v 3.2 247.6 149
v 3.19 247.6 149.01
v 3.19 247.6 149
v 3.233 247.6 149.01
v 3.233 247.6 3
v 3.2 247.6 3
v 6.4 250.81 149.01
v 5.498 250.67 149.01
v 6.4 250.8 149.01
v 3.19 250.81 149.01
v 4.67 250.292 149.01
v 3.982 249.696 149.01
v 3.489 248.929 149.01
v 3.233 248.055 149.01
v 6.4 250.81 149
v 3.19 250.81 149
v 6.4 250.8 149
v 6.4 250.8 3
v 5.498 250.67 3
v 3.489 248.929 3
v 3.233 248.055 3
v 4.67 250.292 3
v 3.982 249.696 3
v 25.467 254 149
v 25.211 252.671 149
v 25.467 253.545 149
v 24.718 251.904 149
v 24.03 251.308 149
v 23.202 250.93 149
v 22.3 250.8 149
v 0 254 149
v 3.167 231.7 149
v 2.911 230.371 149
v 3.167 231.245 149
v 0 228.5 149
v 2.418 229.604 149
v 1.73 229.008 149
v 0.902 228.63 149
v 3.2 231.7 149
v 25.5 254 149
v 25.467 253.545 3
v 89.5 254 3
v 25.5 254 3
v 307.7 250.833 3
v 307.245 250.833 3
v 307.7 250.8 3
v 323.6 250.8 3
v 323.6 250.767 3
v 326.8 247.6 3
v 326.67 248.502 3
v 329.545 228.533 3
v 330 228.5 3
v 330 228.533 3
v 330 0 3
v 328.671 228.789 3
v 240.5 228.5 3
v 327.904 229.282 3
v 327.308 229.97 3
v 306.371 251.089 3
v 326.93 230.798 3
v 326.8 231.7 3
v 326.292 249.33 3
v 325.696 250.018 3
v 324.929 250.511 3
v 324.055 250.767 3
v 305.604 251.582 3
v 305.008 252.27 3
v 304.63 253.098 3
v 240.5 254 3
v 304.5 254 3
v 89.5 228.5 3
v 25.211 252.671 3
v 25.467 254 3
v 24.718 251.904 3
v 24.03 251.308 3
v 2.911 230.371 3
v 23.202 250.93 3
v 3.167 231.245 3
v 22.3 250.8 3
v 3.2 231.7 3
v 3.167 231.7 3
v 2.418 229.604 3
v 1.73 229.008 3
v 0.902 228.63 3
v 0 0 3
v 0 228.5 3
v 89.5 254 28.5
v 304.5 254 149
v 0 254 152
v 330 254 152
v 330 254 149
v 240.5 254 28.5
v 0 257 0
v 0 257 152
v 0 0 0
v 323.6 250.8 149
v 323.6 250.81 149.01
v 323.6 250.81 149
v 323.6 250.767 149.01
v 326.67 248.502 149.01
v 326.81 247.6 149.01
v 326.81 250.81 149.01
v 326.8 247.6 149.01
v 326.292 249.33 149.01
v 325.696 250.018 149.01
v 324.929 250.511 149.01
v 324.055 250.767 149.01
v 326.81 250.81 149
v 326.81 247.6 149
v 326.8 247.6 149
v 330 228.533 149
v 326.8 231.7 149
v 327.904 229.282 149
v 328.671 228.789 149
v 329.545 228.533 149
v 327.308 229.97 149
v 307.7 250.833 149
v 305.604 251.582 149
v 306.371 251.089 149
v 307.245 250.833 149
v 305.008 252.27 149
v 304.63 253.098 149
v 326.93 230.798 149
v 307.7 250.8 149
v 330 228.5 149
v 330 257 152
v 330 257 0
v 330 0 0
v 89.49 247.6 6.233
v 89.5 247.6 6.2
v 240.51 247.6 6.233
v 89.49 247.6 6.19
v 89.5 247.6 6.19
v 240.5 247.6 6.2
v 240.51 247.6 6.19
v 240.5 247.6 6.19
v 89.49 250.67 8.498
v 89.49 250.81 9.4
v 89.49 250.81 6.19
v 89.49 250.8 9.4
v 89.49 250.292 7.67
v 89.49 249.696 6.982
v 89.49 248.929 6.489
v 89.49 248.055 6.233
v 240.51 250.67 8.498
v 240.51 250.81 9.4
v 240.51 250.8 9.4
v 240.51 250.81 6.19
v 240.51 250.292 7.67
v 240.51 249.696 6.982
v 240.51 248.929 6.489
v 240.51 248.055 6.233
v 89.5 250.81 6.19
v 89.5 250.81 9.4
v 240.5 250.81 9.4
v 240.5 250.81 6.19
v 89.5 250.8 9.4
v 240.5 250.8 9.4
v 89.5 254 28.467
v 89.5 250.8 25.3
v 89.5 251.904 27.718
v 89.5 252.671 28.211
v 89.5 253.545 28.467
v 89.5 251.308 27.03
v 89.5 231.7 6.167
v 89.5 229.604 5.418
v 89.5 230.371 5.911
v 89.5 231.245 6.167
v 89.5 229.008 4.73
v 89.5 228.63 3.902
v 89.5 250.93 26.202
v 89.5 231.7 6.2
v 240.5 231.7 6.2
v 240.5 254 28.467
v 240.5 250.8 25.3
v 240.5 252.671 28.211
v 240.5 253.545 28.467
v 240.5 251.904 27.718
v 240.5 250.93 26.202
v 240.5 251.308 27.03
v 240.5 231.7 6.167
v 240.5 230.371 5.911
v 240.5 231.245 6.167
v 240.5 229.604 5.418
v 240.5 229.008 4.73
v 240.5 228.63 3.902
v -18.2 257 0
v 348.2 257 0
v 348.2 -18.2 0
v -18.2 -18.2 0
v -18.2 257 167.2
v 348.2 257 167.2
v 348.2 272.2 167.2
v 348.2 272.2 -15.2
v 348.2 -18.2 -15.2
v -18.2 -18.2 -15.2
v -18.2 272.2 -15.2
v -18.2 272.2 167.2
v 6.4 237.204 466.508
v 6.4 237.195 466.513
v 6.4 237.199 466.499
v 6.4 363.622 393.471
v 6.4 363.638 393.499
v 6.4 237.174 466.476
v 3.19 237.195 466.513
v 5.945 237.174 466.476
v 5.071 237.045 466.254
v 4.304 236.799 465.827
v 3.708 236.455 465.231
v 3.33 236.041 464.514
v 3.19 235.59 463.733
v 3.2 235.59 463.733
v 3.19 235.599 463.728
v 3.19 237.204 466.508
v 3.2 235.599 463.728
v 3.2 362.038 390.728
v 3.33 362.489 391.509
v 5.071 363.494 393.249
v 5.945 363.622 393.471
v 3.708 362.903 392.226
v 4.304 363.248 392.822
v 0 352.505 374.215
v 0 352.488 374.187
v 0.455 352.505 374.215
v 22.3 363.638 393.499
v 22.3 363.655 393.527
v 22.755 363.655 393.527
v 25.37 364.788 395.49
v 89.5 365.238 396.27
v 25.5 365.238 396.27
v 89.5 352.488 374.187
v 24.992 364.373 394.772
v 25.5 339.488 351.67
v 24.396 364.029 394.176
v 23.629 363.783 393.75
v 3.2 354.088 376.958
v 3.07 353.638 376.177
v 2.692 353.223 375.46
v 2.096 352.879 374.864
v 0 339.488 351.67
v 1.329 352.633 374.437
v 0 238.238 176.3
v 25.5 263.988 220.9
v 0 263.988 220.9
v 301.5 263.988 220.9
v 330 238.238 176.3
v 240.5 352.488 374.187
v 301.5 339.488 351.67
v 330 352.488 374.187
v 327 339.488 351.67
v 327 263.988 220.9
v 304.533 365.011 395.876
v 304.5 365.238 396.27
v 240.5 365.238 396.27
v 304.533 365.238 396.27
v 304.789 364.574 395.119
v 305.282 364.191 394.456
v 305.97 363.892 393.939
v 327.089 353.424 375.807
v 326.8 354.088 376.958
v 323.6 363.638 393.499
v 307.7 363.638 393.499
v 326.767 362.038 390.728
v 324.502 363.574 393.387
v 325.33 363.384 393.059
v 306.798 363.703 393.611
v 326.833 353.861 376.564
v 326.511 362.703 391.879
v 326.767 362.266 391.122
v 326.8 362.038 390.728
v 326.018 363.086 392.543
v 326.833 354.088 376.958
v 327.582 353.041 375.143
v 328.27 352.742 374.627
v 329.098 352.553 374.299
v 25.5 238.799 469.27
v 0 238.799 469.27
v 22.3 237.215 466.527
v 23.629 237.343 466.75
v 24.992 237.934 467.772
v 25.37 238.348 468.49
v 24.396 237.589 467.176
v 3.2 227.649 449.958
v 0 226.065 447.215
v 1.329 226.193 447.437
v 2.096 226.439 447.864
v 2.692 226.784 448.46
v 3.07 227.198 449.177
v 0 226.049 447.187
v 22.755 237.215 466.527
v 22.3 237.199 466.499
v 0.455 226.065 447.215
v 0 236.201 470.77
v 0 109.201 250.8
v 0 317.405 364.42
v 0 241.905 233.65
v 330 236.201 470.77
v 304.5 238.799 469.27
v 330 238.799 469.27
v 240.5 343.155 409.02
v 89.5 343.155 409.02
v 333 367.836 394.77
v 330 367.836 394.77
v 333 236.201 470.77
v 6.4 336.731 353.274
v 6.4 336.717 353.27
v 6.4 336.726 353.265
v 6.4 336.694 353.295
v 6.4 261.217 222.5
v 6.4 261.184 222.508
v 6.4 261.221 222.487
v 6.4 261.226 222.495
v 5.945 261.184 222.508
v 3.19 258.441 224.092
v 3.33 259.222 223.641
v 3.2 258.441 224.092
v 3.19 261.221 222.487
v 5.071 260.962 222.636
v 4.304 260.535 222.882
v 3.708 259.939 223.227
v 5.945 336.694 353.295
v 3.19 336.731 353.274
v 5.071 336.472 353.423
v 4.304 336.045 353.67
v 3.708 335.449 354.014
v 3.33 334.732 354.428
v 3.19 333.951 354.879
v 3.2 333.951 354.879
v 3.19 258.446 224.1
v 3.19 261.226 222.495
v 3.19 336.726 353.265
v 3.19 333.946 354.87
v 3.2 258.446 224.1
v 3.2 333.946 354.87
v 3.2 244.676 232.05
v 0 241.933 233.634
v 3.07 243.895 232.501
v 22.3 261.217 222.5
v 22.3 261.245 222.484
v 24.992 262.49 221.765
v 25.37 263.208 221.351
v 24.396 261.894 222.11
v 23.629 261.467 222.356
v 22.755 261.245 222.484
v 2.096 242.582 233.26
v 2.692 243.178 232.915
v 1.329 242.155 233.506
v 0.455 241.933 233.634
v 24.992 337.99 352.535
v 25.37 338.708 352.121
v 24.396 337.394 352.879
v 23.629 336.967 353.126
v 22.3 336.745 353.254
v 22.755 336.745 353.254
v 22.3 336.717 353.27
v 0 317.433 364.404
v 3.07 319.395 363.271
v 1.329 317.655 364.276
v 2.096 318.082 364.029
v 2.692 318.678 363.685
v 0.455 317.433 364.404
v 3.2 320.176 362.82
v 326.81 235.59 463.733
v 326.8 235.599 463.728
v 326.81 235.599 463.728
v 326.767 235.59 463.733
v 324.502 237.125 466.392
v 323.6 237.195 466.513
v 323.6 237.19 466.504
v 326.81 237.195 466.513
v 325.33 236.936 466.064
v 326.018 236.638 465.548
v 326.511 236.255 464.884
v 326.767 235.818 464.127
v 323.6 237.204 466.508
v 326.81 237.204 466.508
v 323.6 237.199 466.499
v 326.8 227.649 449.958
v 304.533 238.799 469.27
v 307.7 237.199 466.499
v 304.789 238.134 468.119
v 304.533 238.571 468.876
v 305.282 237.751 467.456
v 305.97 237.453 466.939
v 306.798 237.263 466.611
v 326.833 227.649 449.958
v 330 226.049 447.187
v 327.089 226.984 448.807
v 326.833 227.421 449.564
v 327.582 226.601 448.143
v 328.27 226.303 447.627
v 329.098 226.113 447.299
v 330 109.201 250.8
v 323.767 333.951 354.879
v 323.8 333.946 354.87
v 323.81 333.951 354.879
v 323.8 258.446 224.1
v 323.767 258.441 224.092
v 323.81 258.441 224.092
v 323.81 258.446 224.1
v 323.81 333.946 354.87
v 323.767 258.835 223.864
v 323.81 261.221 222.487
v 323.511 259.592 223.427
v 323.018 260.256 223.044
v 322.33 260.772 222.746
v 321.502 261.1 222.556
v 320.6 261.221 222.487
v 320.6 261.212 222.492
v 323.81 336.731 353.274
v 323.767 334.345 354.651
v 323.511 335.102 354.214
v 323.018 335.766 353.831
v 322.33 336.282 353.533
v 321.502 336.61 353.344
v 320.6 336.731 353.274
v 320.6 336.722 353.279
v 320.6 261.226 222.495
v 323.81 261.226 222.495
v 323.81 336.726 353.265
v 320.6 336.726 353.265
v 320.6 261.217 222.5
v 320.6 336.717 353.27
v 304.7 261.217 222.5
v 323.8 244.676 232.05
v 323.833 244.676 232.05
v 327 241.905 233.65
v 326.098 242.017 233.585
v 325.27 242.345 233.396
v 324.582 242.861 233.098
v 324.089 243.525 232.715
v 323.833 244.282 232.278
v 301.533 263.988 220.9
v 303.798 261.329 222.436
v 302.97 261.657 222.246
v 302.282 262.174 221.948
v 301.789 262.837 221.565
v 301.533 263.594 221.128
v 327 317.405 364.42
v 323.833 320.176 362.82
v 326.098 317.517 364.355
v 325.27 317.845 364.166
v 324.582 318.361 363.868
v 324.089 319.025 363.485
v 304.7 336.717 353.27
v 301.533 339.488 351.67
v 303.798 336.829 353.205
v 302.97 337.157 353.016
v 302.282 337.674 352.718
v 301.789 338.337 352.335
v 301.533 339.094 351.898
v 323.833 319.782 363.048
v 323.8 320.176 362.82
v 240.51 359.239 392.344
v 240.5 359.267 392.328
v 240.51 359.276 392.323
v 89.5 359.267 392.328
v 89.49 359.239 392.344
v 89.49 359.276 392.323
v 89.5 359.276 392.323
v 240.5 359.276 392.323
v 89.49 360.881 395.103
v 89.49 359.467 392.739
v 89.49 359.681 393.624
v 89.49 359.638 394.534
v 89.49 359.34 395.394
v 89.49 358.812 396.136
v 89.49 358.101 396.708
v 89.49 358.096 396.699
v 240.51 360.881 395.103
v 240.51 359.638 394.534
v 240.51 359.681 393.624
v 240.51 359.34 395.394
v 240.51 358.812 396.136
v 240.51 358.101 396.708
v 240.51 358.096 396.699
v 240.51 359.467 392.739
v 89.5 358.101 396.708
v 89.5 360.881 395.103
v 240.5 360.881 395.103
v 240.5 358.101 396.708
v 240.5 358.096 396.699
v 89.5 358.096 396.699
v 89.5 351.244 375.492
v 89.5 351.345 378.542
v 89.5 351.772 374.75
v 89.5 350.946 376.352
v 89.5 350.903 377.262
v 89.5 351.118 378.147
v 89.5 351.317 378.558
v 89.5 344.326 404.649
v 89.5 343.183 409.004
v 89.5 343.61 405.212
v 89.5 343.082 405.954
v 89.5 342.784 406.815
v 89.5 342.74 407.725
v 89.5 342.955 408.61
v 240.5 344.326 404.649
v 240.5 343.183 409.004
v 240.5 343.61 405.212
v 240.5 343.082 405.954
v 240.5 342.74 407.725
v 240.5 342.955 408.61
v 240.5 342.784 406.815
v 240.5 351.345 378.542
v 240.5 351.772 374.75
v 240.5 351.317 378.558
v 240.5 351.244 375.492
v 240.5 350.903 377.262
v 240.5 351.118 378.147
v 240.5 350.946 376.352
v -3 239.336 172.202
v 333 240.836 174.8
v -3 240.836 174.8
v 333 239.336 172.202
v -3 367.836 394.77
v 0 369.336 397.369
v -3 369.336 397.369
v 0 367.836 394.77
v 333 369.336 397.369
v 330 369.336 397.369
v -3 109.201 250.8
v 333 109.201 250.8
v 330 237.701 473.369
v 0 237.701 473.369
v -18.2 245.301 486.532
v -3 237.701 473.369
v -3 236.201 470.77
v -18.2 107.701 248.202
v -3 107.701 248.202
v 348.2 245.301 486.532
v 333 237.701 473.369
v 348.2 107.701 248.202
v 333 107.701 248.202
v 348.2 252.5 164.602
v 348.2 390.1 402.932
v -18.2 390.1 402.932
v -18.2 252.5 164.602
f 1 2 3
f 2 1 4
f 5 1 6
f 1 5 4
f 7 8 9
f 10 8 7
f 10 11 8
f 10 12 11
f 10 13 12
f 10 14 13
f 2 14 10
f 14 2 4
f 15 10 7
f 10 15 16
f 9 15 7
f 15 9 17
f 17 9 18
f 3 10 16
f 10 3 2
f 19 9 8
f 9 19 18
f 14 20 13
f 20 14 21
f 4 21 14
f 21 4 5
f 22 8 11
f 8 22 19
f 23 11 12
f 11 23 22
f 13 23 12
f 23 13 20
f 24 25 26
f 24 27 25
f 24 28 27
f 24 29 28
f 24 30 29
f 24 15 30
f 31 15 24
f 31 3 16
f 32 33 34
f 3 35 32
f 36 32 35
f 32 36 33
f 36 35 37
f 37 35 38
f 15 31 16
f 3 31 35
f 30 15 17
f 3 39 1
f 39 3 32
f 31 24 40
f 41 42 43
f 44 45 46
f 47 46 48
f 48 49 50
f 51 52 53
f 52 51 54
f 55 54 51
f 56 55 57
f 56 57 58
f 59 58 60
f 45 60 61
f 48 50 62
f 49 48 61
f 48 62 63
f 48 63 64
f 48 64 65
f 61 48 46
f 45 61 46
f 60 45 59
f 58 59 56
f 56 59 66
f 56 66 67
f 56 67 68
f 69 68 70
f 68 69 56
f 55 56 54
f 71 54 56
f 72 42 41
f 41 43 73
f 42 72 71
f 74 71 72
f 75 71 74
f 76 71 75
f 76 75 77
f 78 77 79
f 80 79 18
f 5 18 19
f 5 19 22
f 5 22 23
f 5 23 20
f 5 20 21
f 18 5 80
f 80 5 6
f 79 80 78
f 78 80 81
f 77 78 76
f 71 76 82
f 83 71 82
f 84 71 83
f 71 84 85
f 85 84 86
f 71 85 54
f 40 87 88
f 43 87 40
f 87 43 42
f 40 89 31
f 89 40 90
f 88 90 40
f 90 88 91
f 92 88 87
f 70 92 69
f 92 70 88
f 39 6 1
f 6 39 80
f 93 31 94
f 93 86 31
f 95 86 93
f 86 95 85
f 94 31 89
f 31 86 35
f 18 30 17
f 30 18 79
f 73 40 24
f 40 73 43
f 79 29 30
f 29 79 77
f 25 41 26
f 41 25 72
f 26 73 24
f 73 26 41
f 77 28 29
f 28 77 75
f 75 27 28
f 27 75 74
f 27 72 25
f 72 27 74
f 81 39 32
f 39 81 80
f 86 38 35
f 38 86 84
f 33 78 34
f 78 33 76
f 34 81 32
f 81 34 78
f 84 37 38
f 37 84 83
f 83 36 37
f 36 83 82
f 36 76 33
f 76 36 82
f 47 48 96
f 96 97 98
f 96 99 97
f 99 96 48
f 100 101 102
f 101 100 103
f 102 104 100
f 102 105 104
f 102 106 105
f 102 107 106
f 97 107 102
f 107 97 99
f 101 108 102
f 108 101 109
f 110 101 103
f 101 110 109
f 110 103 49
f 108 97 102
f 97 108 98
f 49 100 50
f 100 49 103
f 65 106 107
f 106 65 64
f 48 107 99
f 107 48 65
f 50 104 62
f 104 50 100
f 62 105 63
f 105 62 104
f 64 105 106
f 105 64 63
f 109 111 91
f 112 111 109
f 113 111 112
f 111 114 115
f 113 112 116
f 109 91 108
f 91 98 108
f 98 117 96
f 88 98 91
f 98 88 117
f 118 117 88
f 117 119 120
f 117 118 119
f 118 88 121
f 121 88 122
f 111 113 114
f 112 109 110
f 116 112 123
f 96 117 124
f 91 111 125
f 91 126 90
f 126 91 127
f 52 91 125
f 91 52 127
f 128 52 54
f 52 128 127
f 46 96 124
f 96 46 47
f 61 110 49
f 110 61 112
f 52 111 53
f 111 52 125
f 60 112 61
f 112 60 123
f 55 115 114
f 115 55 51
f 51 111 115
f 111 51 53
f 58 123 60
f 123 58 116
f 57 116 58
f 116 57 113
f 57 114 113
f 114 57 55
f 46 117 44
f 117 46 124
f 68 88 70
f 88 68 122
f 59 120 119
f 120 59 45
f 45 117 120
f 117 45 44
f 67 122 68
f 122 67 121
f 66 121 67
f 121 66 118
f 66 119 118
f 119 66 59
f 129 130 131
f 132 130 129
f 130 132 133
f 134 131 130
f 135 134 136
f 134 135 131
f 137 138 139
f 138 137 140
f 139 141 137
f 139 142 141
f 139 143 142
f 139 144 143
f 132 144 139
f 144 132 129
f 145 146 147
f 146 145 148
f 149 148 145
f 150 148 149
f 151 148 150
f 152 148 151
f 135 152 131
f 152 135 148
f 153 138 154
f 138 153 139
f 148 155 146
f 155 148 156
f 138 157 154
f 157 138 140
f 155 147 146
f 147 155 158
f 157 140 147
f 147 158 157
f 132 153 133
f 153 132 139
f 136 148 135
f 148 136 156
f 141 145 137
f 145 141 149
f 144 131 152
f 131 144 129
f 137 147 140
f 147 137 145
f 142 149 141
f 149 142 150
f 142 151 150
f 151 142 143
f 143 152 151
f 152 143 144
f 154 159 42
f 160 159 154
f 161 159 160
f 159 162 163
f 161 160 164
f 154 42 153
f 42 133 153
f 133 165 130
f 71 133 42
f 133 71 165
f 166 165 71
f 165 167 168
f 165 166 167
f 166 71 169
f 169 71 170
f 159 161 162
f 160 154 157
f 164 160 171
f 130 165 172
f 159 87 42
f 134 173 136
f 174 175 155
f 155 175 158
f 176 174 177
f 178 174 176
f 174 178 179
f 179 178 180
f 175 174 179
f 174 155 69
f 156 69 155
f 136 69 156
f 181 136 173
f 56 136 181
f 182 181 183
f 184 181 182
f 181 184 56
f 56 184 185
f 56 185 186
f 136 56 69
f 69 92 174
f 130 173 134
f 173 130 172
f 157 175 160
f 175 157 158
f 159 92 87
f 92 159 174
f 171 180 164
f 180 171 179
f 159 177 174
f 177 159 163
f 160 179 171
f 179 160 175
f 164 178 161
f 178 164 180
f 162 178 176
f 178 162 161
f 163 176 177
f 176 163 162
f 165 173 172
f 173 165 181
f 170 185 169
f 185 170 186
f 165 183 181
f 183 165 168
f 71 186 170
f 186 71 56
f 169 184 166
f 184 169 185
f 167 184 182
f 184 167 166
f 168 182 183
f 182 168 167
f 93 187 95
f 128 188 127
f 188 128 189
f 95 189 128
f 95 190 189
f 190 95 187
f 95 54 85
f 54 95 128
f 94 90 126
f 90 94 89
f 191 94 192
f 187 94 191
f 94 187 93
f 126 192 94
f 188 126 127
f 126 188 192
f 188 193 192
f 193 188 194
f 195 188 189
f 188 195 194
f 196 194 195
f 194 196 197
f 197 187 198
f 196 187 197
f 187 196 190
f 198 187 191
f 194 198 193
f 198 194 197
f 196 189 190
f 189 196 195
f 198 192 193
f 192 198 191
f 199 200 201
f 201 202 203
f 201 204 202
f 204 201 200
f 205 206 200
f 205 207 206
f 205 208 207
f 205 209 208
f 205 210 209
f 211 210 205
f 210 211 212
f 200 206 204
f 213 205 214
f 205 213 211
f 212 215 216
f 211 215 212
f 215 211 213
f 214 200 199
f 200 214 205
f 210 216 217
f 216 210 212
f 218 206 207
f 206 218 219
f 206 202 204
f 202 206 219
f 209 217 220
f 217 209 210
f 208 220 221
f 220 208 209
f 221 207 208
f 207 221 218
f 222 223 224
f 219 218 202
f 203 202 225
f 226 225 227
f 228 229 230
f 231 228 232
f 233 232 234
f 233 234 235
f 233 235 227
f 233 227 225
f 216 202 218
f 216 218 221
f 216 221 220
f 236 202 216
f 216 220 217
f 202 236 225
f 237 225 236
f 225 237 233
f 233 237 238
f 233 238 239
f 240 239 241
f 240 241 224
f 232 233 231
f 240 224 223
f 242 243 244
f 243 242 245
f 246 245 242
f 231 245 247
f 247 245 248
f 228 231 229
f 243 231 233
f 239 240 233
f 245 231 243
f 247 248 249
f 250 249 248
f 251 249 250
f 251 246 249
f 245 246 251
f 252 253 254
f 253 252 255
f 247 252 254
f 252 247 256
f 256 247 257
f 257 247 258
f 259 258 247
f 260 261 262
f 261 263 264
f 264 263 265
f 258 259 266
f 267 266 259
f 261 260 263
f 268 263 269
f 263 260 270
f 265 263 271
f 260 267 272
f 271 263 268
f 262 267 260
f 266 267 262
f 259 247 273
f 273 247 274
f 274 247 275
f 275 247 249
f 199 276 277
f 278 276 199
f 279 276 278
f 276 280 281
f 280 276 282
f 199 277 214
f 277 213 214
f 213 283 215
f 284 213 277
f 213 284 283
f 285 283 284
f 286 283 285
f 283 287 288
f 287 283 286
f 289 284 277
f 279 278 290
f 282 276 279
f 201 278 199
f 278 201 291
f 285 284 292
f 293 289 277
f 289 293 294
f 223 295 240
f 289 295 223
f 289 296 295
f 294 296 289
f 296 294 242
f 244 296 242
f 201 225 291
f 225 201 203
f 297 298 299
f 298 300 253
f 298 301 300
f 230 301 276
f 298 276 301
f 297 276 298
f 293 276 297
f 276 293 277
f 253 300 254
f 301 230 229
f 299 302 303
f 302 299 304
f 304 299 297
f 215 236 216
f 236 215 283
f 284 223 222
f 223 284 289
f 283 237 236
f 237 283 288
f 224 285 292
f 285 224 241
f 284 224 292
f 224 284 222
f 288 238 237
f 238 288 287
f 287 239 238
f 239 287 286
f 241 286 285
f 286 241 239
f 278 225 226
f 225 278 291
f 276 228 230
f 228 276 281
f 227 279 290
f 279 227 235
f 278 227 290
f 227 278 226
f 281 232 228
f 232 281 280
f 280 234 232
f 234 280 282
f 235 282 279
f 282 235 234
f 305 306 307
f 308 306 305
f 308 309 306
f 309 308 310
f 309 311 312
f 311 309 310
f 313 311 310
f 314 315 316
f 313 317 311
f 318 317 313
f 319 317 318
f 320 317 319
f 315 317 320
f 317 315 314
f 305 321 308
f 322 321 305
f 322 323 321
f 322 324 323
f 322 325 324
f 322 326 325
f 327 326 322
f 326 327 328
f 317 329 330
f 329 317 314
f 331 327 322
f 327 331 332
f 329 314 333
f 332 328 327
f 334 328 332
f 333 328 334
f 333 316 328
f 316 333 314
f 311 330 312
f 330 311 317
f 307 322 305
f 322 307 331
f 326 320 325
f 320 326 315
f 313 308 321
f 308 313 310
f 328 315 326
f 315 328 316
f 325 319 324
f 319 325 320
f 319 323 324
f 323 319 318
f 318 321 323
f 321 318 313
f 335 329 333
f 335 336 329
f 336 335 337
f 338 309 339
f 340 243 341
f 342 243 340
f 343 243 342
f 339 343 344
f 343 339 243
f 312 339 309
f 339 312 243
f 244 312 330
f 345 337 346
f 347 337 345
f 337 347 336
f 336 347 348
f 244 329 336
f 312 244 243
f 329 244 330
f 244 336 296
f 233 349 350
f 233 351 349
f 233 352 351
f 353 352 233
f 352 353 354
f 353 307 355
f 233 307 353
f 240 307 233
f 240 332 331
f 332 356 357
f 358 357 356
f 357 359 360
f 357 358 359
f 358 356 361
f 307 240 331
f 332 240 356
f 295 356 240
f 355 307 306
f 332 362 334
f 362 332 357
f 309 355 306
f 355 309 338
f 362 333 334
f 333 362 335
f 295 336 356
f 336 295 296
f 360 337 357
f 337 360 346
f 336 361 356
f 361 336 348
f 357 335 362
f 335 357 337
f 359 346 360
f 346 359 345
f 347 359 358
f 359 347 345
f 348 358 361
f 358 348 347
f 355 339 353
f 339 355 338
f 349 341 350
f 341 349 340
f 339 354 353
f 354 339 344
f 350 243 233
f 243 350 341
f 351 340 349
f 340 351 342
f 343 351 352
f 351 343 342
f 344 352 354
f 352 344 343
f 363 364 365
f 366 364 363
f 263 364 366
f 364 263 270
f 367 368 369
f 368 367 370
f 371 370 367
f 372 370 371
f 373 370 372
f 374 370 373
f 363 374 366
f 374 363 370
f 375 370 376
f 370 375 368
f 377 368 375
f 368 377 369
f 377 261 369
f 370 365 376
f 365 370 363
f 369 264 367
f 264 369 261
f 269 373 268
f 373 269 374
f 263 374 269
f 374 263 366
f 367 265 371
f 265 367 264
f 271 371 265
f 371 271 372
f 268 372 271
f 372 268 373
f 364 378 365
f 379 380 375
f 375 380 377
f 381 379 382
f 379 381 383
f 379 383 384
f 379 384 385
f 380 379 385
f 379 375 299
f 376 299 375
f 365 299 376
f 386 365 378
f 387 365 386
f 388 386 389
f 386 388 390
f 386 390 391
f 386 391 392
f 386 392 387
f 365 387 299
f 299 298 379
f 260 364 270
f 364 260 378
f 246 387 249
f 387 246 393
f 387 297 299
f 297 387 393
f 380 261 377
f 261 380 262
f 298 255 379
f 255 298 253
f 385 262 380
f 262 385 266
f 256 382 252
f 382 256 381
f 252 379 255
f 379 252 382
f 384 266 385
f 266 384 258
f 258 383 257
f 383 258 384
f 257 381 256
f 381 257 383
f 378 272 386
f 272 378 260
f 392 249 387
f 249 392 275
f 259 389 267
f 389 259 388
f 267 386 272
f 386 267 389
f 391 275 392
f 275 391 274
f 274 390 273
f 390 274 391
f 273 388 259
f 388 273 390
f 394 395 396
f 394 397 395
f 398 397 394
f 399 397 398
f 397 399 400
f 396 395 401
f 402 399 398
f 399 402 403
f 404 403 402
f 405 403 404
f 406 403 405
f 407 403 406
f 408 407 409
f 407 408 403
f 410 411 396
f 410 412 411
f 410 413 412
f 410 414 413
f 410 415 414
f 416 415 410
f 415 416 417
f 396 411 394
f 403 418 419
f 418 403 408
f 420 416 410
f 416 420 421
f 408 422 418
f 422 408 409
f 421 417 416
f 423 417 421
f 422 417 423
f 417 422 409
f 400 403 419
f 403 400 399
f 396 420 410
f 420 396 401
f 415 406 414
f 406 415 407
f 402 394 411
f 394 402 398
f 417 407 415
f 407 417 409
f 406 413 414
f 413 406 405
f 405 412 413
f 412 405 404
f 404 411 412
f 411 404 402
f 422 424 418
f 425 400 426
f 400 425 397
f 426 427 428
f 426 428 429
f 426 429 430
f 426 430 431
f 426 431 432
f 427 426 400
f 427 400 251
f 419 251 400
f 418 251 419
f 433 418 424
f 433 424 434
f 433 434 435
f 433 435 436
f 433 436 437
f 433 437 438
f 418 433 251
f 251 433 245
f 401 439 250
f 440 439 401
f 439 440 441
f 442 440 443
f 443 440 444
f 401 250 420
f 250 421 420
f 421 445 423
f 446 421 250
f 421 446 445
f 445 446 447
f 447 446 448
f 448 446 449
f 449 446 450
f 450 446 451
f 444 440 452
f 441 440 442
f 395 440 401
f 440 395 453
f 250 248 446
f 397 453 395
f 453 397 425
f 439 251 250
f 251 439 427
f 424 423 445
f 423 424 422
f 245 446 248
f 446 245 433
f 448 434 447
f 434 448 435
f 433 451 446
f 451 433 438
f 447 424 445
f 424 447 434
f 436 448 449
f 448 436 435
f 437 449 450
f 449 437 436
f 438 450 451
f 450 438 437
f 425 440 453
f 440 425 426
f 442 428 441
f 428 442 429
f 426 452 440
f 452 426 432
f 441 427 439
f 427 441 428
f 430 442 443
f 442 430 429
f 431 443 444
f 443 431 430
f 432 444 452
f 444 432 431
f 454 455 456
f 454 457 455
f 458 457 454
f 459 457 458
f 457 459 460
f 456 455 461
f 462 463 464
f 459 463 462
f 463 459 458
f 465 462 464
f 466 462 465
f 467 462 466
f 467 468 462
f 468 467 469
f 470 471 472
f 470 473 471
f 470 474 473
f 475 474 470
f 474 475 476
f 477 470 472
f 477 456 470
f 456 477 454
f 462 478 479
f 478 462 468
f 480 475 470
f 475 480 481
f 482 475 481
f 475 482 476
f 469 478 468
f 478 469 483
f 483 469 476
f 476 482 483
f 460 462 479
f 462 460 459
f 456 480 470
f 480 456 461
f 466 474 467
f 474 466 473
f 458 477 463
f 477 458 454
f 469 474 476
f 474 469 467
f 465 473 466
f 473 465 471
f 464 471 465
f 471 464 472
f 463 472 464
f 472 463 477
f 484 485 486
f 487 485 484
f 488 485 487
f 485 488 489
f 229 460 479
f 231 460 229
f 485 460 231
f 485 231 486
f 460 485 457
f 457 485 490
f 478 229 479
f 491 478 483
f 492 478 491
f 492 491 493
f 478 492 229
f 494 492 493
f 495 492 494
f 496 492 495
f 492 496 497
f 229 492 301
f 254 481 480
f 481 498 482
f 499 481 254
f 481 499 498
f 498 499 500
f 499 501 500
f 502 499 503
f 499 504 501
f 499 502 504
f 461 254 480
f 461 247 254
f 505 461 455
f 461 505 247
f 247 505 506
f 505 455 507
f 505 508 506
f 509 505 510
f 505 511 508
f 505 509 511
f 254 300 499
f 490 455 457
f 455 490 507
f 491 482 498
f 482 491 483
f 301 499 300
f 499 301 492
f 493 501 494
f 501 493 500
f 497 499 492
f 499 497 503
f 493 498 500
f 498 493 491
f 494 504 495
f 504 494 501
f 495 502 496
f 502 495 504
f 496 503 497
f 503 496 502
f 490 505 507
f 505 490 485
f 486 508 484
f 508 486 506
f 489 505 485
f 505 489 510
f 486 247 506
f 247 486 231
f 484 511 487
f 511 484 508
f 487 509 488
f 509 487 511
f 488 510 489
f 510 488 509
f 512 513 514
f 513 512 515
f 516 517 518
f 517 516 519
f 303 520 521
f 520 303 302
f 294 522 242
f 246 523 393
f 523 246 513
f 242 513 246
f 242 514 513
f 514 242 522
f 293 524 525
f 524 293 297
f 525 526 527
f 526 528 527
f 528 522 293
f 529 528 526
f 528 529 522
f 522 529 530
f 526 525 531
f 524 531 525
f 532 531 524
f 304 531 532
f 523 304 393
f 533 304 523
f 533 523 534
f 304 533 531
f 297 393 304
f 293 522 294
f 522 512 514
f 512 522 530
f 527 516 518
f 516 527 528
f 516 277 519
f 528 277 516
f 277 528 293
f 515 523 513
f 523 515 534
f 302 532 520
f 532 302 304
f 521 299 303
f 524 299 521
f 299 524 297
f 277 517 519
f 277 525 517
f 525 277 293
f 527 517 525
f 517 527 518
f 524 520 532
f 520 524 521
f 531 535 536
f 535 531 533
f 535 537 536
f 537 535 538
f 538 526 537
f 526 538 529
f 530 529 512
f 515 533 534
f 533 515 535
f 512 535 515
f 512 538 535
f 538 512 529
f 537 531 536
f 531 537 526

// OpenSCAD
// file: ../Parts/rounder.scad
// rounder.scad
// cutting tool for rounding off corners with a cylinder

//---------------------
module rounder(
r=10,   // radius
h=10,   // height
f=22,    // $fn
extra=0.01  // extra size for the cube
){

difference(){
  translate([-extra,-extra,-extra])
  cube([r+extra,r+extra,h+2*extra]);
  translate([r,r,-1])
  cylinder(r=r,h=h+2,$fn=f);
}

}

//========================

rounder();

//========================
// main file
//=================================================================================
// Calorimeter1.scad
// Calorimeter for inverter loss estimation using immersion cooling
//
//
// Dr Tom Flint, 10 March 2021
//=================================================================================


use <../Parts/rounder.scad>

//--------------------------------------------------
module L1(len=10){

difference(){
  union(){
    cube([25.5,3.2,len]);
    cube([3.2,25.5,len]);  
    translate([3.2,3.2,0])
    rounder(r=3.2,h=len);
  }
  
  translate([3.2,25.5,0])
  rotate([0,0,180])
  rounder(r=3.2,h=len);

  translate([25.5,3.2,0])
  rotate([0,0,180])
  rounder(r=3.2,h=len);
}

}
  
//--------------------------------------------------
module base1(){
  // base plate
  color("gray")
  cube([330,254,3]);
  
  // back plate
  color("orange")
  translate([0,254,0])
  cube([330,3,152]);
  
  // back left vertical L
  translate([0,254,3])
  rotate([0,0,-90])
  L1(len=152-6);
  
  // back right vertical L
  translate([330,254,3])
  rotate([0,0,180])
  L1(len=152-6);

  // back horizontal L
  translate([(330+151)/2,254,3])
  rotate([0,-90,0])
  rotate([0,0,-90])
  L1(len=151);

}
//--------------------------------------------------
module base2(){
  // base plate
  color("pink")
  translate([-15.2-3,-15.2-3,-15.2])
  cube([330+2*(15.2+3),254+2*(15.2+3),15.2]);
  
  // back plate
  color("pink")
  translate([-3-15.2,254+3,0])
  cube([330+2*(3+15.2),15.2,152+15.2]);
  

}

//--------------------------------------------------
// AL sheets 3 mm thick and 90 degree L stock

module lid1(){

if(1){
  // top plate
  color("silver")
  translate([0,0,152-3])
  cube([330,254,3]);
}

  // left plate
  color("red")
  translate([-3,0,0])
  cube([3,254,152]);
  
  // right plate
  color("green")
  translate([330,0,0])
  cube([3,254,152]);
  
  // front plate
  color("yellow")
  translate([0,-3,0])
  cube([330,3,152]);
  
  // front left vertical L
  translate([0,0,3])
  L1(len=152-6);
  
  // left horizontal L
  translate([0,254/2-151/2,152-3])
  rotate([-90,0,0])
  L1(len=151);

  // front right vertical L
  translate([330,0,3])
  rotate([0,0,90])
  L1(len=152-6);

  // right horizontal L
  translate([330-3,254/2-151/2,152-3])
  rotate([-90,0,0])
  rotate([0,0,90])
  L1(len=151);


  // front horizontal L
  translate([(330+151)/2,0,152-3])
  rotate([0,-90,0])
  rotate([0,0,90])
  L1(len=151);


}  

//--------------------------------------------------
// insulated panels XPS foam 1/2" nominal 15.2 mm measured R3 value

module lid2(){

if(1){
  // top plate
  color("pink")
  translate([-15.2-3,-15.2-3,152])
  cube([330+2*(3+15.2),254+6+15.2,15.2]);
}

  // left plate
  color("pink")
  translate([-15.2-3,-3,0])
  cube([15.2,254+6,152]);
  
  // right plate
  color("pink")
  translate([330+3,-3,0])
  cube([15.2,254+6,152]);
  
  // front plate
  color("pink")
  translate([-15.2-3,-3-15.2,0])
  cube([330+2*(15.2+3),15.2,152]);

}

//=================================================================================

//L1(len=60);


// base section
if(1){
  base1();
}
if(1){
  base2();
}

translate([0,254,152+15.2])
rotate([-120,0,0])
translate([0,-254,-152-15.2])
{

// lid
if(1){
  lid1();
}

if(1){
  lid2();
}

}
//=================================================================================
